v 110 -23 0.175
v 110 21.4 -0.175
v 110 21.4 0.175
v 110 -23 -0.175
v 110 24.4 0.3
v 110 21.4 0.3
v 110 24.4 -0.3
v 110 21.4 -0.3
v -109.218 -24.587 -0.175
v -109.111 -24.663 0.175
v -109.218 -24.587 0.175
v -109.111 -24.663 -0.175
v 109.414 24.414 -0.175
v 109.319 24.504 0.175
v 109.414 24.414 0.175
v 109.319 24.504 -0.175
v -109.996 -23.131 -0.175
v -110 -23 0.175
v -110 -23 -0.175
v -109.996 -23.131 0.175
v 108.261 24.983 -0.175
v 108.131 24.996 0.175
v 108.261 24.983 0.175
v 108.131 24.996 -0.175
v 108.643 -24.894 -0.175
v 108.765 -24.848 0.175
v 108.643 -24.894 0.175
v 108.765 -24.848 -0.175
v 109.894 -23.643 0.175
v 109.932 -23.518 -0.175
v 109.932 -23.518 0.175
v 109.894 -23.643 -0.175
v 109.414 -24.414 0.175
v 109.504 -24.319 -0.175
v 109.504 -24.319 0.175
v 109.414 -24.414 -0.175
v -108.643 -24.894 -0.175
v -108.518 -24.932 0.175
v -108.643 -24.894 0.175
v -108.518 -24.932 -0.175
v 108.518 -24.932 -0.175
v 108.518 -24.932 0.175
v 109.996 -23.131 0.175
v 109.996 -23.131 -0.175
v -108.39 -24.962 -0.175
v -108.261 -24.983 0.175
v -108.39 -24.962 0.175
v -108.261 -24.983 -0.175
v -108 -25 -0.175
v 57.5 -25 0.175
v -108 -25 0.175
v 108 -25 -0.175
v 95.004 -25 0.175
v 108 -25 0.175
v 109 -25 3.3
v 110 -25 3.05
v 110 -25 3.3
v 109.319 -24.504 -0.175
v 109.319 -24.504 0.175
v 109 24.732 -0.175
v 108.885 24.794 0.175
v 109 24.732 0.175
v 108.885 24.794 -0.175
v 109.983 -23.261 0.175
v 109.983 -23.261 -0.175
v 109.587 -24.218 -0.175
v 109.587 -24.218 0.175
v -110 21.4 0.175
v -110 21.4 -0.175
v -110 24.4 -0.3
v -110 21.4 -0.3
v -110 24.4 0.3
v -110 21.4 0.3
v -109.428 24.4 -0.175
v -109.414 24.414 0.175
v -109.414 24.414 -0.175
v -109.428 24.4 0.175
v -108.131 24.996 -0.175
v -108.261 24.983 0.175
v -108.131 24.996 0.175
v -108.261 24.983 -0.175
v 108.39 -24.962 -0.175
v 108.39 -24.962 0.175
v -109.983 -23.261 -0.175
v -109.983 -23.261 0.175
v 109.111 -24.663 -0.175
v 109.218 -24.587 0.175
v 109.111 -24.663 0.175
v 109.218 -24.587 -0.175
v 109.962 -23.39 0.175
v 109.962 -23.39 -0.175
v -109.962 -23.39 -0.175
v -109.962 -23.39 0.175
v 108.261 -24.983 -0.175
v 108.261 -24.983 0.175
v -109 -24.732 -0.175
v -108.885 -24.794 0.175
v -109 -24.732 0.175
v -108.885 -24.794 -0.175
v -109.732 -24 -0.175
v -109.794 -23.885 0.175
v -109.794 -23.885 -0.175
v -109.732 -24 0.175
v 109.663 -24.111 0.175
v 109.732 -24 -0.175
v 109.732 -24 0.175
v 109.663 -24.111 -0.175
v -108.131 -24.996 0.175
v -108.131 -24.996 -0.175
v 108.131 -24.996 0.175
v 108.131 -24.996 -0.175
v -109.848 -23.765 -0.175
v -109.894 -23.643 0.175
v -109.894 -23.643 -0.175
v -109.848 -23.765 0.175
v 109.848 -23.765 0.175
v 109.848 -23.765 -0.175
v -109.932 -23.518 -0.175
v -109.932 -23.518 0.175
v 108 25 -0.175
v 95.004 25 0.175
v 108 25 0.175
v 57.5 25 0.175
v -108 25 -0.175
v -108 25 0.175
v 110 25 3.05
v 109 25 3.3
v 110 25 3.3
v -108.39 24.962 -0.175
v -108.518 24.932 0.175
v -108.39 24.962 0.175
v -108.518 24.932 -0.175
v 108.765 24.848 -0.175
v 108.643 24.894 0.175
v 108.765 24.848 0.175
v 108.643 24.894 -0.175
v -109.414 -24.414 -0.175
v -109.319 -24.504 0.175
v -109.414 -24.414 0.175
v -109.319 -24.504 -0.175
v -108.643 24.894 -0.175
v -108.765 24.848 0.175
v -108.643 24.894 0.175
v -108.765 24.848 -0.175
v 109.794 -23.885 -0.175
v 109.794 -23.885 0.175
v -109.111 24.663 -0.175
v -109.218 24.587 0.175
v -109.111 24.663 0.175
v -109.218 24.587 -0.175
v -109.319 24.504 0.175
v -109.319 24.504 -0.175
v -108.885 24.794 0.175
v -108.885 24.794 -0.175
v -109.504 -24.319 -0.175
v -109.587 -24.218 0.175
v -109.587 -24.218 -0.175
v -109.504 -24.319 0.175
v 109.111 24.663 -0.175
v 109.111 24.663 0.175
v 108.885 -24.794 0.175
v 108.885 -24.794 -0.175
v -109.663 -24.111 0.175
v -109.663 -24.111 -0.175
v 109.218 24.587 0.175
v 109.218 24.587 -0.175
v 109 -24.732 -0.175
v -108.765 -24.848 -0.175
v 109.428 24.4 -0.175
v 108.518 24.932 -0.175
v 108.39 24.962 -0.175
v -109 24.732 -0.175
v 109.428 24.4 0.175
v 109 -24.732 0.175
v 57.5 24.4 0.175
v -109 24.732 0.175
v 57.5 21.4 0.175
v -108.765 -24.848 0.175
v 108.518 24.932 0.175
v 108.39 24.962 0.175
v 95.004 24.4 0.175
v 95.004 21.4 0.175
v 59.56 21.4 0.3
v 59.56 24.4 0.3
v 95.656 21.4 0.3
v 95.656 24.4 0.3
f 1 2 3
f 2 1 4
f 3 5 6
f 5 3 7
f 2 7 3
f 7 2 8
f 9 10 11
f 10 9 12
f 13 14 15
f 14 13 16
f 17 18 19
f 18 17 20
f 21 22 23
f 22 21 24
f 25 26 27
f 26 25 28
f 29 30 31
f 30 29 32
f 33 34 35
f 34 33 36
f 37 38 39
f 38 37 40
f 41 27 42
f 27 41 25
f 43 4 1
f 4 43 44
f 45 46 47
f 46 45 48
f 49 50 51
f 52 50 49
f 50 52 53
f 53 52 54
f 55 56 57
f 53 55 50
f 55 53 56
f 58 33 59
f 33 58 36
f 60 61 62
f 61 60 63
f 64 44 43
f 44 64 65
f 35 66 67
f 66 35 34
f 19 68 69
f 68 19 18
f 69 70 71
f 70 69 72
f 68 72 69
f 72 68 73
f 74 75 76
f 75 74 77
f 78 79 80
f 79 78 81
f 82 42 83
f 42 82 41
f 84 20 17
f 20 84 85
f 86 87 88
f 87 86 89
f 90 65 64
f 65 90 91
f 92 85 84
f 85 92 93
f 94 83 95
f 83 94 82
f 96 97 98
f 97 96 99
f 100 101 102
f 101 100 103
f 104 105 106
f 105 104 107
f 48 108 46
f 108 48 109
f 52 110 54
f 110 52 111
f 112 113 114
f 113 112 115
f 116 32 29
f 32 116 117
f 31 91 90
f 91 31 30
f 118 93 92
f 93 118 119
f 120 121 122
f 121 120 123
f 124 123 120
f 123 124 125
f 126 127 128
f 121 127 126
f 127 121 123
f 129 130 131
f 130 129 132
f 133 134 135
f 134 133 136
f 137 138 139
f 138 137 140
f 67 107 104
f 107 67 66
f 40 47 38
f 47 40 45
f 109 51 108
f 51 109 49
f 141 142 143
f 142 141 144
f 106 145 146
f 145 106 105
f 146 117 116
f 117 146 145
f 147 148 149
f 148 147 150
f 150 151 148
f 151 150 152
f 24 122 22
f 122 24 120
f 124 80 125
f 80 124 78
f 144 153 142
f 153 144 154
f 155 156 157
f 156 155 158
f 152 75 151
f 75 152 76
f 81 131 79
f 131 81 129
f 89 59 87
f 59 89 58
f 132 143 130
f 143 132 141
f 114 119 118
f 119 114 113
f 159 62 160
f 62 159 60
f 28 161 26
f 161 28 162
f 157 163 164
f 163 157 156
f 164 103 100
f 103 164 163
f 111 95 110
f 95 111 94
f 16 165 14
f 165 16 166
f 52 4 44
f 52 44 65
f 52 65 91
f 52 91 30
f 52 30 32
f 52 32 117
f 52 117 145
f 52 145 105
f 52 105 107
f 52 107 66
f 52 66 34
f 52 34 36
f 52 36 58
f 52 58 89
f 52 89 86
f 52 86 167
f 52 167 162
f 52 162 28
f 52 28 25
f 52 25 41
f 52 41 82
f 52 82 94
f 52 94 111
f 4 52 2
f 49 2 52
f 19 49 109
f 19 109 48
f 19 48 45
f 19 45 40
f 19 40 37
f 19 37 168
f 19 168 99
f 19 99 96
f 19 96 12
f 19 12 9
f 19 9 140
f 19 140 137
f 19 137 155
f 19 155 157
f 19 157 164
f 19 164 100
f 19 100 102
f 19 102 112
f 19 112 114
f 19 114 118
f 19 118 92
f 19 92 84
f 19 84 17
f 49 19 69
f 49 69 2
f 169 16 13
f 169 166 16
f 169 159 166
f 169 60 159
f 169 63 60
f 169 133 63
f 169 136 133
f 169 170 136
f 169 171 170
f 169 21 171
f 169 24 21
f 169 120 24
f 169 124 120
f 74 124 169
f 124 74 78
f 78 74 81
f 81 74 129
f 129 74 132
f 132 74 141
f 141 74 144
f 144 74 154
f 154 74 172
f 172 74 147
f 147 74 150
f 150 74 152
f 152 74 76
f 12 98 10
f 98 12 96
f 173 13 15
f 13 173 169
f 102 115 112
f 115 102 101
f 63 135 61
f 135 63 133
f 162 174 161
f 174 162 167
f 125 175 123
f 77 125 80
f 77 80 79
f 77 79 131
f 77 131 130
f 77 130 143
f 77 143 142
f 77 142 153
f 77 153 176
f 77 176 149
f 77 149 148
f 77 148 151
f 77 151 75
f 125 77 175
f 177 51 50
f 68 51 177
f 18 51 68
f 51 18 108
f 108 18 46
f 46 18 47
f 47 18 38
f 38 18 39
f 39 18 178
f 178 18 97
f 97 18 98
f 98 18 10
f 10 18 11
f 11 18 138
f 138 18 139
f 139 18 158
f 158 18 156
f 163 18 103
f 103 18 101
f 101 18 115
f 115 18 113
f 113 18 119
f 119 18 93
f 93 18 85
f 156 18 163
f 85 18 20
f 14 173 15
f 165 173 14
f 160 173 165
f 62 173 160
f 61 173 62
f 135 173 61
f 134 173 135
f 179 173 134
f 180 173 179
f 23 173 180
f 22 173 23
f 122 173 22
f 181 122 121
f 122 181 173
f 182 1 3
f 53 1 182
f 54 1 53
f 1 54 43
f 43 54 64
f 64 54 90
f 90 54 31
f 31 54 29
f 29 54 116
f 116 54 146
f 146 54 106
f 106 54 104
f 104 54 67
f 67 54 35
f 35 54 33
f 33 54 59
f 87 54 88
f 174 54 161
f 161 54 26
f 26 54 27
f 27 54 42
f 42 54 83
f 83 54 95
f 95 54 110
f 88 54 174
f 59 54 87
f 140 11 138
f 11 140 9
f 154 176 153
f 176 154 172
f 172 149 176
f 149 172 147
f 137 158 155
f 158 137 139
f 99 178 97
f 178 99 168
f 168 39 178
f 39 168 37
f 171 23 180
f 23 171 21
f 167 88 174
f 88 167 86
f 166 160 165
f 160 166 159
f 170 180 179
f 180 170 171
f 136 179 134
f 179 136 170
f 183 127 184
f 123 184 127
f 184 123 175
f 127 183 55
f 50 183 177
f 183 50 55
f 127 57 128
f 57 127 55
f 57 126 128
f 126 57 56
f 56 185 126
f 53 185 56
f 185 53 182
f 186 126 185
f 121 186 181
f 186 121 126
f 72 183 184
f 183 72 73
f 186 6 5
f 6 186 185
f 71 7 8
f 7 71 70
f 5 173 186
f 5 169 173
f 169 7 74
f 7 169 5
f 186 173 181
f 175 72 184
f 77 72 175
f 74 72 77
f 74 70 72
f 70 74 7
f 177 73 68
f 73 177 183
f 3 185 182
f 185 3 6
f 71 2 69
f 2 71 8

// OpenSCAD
// Aluminium foil tape SHEET (flat strip) - ONE connected solid
// Structural fix: model is now a standalone sheet-like foil tape, not a roll.
// All translate() values are formula-based; all parts overlap slightly to ensure a single solid.

$fn = 96;

// Parameters (mm)
sheet_len        = 220;   // overall length of the tape sheet
sheet_w          = 50;    // width of the tape sheet
tape_thickness   = 0.35;  // thin foil tape thickness (simplified)
corner_radius    = 2.0;   // rounded corners
peel_len         = 35;    // length of slightly lifted/peeled end
peel_lift        = 3.0;   // lift height at the very end
overlap          = 1.2;   // 1-2mm overlap for guaranteed manifold union

// 2D rounded rectangle
module rounded_rect_2d(L, W, R) {
    R2 = min(R, min(L, W)/2);
    minkowski() {
        square([L - 2*R2, W - 2*R2], center=true);
        circle(r=R2);
    }
}

// Main flat sheet
module foil_sheet_main() {
    linear_extrude(height=tape_thickness, center=true)
        rounded_rect_2d(sheet_len, sheet_w, corner_radius);
}

// Slightly peeled/lifted end (still connected to the sheet via overlap)
module foil_sheet_peeled_end() {
    // Place peeled section at +X end of the sheet
    // Main sheet spans X: [-sheet_len/2, +sheet_len/2]
    // Peeled section spans X: [sheet_len/2 - peel_len, sheet_len/2]
    x_root = sheet_len/2 - peel_len + overlap/2; // overlap into main sheet
    x_tip  = sheet_len/2 - 0.5;                  // near the very end

    // Thin "plates" hulled to form a gentle wedge
    plate_t = 0.25;

    hull() {
        // Root plate: sits on top surface of the main sheet, overlapping into it
        translate([x_root, 0, tape_thickness/2 - plate_t/2])
            cube([peel_len + overlap, sheet_w, plate_t], center=true);

        // Tip plate: lifted in +Z to suggest peeling
        translate([x_tip, 0, tape_thickness/2 + peel_lift])
            cube([1.0, sheet_w, plate_t], center=true);
    }
}

// Subtle edge thickening strip (suggests tape body; kept simple and connected)
module foil_edge_reinforcement() {
    // A very shallow rib along one long edge, embedded into the sheet
    rib_w = 3.0;
    rib_t = 0.25;

    // Position rib along +Y edge, overlapping into the sheet by overlap
    y_center = (sheet_w/2 - rib_w/2) - overlap/2;

    translate([0, y_center, 0])
        cube([sheet_len, rib_w, tape_thickness + rib_t], center=true);
}

// Assemble: one connected solid
module aluminium_foil_tape_sheet() {
    union() {
        foil_sheet_main();
        foil_sheet_peeled_end();       // overlaps into main sheet
        foil_edge_reinforcement();     // overlaps into main sheet
    }
}

aluminium_foil_tape_sheet();
